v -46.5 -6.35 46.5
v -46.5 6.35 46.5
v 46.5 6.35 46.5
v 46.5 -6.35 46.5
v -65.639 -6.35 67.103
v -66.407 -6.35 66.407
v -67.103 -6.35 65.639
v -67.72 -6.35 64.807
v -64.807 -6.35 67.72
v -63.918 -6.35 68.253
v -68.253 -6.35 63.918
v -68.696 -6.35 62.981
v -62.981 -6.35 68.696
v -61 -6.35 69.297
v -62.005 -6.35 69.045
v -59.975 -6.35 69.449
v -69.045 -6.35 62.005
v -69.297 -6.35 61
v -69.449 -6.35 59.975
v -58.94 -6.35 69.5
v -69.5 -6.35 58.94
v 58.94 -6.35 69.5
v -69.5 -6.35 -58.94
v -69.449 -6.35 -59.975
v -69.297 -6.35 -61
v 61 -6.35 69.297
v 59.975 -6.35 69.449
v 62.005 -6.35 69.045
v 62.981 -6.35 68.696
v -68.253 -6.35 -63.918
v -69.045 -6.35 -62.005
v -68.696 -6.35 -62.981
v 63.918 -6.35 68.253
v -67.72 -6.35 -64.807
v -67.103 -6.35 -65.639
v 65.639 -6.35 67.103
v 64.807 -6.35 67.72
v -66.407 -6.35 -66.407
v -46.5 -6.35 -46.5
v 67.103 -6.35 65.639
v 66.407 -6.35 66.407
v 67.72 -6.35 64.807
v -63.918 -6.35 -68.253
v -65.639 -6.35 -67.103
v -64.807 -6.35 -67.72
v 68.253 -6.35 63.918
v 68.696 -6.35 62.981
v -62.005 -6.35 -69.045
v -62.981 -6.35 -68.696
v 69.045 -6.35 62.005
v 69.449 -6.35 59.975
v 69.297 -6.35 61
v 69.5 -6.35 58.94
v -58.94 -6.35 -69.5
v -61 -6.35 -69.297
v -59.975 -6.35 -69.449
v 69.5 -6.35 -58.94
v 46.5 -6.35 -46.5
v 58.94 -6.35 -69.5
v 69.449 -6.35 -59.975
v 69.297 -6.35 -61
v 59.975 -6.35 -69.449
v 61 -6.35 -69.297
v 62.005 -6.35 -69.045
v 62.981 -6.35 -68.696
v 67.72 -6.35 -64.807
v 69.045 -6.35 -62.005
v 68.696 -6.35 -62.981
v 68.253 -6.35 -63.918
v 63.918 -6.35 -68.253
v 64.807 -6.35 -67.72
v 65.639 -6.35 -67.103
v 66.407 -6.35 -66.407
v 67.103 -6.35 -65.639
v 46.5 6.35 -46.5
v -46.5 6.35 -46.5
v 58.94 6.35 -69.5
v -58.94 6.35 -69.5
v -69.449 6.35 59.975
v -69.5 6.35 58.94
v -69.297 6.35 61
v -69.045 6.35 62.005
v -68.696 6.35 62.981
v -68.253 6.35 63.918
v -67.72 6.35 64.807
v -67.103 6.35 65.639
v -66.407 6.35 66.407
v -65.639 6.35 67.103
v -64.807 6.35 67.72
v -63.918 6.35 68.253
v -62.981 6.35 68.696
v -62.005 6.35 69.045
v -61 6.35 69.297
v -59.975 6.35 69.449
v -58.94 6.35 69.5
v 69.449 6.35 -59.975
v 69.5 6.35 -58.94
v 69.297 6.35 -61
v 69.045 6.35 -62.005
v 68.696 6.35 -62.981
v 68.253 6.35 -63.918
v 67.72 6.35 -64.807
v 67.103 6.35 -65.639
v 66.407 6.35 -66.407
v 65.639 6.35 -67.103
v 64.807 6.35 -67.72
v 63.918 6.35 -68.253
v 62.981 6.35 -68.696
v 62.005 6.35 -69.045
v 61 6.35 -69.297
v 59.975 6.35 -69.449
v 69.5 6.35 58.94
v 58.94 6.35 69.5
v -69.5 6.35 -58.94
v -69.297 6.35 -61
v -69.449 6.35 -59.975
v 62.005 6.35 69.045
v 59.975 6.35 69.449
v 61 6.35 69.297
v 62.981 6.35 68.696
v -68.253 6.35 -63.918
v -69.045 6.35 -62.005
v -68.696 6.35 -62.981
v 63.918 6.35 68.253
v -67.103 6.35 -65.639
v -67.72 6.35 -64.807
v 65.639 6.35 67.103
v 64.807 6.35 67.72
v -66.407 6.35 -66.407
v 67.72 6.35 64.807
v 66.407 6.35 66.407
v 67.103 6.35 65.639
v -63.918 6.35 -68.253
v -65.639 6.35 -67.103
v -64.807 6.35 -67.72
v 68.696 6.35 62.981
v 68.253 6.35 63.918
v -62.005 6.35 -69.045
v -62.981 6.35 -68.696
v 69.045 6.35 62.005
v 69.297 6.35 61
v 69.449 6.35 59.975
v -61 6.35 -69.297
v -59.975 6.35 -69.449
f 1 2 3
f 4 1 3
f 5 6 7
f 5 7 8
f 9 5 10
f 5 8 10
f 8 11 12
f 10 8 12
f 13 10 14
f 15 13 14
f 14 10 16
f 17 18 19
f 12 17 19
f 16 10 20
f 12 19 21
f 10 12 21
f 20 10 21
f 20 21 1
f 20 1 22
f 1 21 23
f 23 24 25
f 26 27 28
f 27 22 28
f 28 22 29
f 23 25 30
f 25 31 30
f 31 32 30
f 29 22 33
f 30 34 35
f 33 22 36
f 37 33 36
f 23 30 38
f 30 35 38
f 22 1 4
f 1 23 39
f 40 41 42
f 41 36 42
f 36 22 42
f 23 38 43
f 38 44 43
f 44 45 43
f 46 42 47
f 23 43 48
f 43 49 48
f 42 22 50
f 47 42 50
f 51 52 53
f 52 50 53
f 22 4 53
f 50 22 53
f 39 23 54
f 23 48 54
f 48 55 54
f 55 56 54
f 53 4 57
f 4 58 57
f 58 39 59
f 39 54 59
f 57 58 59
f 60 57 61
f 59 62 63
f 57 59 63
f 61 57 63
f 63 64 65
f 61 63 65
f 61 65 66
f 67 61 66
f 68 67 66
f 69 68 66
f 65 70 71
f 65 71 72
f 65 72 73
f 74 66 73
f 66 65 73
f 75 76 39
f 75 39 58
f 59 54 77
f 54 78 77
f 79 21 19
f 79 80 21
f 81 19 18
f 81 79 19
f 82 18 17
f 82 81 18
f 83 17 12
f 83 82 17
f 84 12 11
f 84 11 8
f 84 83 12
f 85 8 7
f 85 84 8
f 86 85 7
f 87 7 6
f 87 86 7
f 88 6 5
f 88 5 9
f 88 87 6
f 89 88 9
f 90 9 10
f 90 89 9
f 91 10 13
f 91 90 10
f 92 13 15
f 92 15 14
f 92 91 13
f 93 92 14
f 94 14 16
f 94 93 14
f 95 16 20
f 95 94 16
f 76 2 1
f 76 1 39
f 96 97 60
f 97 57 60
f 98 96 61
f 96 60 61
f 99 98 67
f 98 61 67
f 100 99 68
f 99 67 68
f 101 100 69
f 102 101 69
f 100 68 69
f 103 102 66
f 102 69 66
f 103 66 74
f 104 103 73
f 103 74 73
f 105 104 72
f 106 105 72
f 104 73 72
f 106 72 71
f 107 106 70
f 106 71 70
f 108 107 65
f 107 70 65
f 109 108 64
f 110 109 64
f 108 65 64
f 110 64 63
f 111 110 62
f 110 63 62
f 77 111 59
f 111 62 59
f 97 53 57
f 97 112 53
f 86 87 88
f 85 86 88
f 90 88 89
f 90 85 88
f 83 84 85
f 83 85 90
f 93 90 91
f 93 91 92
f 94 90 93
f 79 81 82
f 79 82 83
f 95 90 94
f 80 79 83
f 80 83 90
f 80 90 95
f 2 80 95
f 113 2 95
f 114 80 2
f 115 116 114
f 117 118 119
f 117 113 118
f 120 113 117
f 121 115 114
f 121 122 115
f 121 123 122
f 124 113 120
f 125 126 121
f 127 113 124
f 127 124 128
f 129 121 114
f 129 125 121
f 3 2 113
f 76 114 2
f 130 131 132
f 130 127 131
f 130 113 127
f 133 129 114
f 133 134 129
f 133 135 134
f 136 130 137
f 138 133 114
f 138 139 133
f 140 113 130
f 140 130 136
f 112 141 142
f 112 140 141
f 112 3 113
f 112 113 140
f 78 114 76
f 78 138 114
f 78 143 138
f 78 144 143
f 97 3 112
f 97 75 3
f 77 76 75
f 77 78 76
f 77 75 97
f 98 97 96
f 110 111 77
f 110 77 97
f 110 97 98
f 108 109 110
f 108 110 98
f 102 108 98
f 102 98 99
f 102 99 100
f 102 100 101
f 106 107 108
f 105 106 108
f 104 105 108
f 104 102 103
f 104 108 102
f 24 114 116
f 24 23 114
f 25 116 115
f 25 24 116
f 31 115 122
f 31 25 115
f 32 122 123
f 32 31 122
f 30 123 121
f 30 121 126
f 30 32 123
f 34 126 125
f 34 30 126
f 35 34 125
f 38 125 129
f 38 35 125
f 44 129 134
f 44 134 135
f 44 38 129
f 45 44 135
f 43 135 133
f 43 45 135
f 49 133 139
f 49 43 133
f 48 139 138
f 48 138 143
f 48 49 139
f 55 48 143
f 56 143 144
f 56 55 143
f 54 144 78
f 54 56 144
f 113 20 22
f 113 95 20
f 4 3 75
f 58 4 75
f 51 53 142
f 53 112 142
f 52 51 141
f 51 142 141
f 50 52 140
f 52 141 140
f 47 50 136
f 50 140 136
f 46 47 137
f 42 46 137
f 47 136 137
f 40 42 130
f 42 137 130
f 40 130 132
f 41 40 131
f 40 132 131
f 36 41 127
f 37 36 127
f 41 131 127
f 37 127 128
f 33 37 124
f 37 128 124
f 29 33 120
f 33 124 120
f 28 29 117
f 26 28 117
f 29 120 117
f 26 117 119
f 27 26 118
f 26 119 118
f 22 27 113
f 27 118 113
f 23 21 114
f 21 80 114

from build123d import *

# Parameters (mm, degrees)
SKETCH1_W           = 139
SKETCH1_H           = 139
BOSS_EXTRUDE1_DEPTH = 6.35
FILLET1_R           = 10.56
SKETCH2_W           = 93
SKETCH2_H           = 93
SLOTCUT_DEPTH       = 100.104944377


with BuildPart() as part:
    # Sketch1 → Boss-Extrude1 (new, symmetric)
    with BuildSketch(Plane(origin=(0, 0, 0), x_dir=(1, 0, 0), z_dir=(0, 1, 0))):
        Rectangle(SKETCH1_W, SKETCH1_H)
    extrude(amount=BOSS_EXTRUDE1_DEPTH, both=True)

    # Fillet1
    fillet1_edges = [part.edges().sort_by_distance(p)[0] for p in [
        (69.5, 0, 69.5),
        (-69.5, 0, 69.5),
        (-69.5, 0, -69.5),
        (69.5, 0, -69.5),
    ]]
    fillet(fillet1_edges, radius=FILLET1_R)

    # Sketch2 → SlotCut (cut, through all)
    with BuildSketch(Plane(origin=(0, 6.35, 0), x_dir=(1, 0, 0), z_dir=(0, 1, 0))):
        Rectangle(SKETCH2_W, SKETCH2_H)
    extrude(amount=-SLOTCUT_DEPTH, mode=Mode.SUBTRACT)


solid = part.part
